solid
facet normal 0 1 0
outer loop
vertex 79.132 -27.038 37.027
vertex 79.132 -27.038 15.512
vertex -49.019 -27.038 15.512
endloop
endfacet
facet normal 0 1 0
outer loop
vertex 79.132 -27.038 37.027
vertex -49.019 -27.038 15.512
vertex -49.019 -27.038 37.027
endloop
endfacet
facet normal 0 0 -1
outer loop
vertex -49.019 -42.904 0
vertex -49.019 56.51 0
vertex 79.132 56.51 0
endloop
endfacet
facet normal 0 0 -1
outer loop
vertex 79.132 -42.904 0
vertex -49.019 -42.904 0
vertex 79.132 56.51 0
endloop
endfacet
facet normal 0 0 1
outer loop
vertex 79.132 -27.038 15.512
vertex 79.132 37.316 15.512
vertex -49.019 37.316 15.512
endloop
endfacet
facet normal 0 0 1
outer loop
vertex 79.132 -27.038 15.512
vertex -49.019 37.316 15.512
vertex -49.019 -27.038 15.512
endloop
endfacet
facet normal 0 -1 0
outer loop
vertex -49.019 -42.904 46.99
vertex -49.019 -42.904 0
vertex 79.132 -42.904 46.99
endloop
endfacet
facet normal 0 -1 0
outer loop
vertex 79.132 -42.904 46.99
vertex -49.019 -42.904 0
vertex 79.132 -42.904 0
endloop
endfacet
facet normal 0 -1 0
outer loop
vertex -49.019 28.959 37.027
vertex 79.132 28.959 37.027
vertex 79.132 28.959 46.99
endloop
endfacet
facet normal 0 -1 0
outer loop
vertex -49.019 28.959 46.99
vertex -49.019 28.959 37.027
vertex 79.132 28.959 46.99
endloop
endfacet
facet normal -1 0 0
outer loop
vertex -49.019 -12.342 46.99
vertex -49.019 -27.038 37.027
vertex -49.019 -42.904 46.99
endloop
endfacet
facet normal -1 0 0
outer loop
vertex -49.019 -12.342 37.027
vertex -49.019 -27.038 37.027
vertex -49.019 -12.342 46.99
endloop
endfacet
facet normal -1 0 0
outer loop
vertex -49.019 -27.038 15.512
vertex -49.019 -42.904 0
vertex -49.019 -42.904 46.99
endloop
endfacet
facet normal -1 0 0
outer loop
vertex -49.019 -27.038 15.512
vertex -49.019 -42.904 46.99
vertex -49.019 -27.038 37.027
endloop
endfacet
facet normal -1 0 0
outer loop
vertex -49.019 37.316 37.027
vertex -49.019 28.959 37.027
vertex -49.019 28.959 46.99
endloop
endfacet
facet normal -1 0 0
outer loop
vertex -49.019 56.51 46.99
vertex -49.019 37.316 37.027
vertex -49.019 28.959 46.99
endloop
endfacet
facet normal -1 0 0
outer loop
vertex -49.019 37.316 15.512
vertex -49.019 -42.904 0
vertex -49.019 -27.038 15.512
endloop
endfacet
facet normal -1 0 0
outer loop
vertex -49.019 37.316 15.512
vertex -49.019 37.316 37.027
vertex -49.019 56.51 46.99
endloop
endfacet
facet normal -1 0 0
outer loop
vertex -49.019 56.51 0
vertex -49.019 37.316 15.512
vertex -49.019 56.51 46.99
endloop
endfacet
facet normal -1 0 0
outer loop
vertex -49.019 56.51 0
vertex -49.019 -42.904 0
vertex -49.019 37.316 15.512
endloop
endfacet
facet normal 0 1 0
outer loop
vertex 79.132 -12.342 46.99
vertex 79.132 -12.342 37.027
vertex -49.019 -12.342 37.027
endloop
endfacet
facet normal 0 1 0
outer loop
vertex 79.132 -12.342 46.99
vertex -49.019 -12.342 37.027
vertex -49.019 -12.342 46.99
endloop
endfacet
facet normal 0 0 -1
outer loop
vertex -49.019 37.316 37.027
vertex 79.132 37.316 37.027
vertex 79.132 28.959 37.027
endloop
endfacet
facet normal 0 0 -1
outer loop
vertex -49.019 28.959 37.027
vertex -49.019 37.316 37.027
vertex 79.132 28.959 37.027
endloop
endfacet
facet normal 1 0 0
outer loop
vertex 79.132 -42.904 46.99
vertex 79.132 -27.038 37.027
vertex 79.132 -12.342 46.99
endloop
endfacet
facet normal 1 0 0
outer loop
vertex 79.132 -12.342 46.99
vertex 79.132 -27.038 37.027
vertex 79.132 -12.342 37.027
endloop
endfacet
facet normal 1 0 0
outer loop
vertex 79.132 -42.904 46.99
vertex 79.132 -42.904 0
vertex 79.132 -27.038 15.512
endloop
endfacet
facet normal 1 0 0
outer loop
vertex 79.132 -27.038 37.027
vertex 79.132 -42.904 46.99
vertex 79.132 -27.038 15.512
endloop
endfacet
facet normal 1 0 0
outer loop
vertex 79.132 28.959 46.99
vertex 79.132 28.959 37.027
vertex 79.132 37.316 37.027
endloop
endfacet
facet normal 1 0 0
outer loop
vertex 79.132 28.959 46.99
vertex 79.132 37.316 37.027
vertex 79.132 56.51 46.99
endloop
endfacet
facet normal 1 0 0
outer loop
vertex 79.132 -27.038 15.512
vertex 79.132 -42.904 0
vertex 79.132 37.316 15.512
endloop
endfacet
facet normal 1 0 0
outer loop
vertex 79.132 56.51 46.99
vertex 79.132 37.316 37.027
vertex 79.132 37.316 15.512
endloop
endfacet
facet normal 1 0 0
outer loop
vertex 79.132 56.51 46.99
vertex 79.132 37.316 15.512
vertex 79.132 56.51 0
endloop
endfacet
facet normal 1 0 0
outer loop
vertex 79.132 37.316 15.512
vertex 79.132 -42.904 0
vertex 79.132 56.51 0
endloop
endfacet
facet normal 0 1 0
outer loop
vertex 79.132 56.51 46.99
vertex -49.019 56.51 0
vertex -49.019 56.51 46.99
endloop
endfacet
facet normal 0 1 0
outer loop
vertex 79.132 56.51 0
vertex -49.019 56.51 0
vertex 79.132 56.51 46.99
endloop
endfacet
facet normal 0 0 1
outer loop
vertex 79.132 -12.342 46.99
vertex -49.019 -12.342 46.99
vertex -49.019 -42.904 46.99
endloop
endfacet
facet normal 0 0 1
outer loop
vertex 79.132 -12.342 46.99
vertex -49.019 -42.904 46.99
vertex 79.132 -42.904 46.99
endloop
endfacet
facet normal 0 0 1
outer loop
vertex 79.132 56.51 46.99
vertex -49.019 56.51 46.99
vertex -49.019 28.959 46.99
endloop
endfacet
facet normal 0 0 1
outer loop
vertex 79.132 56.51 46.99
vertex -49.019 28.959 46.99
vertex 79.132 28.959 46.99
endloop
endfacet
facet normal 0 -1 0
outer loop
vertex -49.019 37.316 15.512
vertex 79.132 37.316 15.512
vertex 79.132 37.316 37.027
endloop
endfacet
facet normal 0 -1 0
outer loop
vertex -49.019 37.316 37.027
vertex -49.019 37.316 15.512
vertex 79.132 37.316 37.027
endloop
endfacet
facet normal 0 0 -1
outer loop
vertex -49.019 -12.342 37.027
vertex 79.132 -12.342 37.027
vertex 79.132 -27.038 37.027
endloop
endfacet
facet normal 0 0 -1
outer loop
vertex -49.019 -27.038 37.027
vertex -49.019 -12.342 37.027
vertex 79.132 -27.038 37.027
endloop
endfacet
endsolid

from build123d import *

# Parameters (mm, degrees)
F0_W     = 128.1502880156
F0_H     = 99.4144454598
F1_DEPTH = 46.99
F3_W     = 64.353780821
F3_H     = 21.5152939782
F4_DEPTH = 102.7512880156
F5_W     = 41.3016797975
F5_H     = 23.244202137
F6_DEPTH = 167.894
F7_DEPTH = 64.008
F8_DEPTH = 88.138


with BuildPart() as f1:
    # F0 (on Top) → F1 (new body)
    with BuildSketch(Plane.XY):
        with Locations((15.0564964861, 6.8030394614)):
            Rectangle(F0_W, F0_H)
    extrude(amount=F1_DEPTH)

    # F3 (on offset) → F4 (cut, through all)
    with BuildSketch(Plane(origin=(-23.6186475217, 0, 0), x_dir=(0, -1, 0), z_dir=(-1, 0, 0))):
        with Locations((-5.138698034, 26.2697902508)):
            Rectangle(F3_W, F3_H)
    extrude(amount=-F4_DEPTH, mode=Mode.SUBTRACT)

    # F5 (on offset) → F6 (cut)
    with BuildSketch(Plane(origin=(-23.6186475217, 0, 0), x_dir=(0, -1, 0), z_dir=(-1, 0, 0))):
        with Locations((-8.3083617501, 44.8075197637)):
            Rectangle(F5_W, F5_H)
    extrude(amount=-F6_DEPTH, mode=Mode.SUBTRACT)

    # F3 (on offset) → F7 (cut)
    with BuildSketch(Plane(origin=(-23.6186475217, 0, 0), x_dir=(0, -1, 0), z_dir=(-1, 0, 0))):
        with Locations((-5.138698034, 26.2697902508)):
            Rectangle(F3_W, F3_H)
    extrude(amount=F7_DEPTH, mode=Mode.SUBTRACT)

    # F5 (on offset) → F8 (cut)
    with BuildSketch(Plane(origin=(-23.6186475217, 0, 0), x_dir=(0, -1, 0), z_dir=(-1, 0, 0))):
        with Locations((-8.3083617501, 44.8075197637)):
            Rectangle(F5_W, F5_H)
    extrude(amount=F8_DEPTH, mode=Mode.SUBTRACT)


solid = f1.part
